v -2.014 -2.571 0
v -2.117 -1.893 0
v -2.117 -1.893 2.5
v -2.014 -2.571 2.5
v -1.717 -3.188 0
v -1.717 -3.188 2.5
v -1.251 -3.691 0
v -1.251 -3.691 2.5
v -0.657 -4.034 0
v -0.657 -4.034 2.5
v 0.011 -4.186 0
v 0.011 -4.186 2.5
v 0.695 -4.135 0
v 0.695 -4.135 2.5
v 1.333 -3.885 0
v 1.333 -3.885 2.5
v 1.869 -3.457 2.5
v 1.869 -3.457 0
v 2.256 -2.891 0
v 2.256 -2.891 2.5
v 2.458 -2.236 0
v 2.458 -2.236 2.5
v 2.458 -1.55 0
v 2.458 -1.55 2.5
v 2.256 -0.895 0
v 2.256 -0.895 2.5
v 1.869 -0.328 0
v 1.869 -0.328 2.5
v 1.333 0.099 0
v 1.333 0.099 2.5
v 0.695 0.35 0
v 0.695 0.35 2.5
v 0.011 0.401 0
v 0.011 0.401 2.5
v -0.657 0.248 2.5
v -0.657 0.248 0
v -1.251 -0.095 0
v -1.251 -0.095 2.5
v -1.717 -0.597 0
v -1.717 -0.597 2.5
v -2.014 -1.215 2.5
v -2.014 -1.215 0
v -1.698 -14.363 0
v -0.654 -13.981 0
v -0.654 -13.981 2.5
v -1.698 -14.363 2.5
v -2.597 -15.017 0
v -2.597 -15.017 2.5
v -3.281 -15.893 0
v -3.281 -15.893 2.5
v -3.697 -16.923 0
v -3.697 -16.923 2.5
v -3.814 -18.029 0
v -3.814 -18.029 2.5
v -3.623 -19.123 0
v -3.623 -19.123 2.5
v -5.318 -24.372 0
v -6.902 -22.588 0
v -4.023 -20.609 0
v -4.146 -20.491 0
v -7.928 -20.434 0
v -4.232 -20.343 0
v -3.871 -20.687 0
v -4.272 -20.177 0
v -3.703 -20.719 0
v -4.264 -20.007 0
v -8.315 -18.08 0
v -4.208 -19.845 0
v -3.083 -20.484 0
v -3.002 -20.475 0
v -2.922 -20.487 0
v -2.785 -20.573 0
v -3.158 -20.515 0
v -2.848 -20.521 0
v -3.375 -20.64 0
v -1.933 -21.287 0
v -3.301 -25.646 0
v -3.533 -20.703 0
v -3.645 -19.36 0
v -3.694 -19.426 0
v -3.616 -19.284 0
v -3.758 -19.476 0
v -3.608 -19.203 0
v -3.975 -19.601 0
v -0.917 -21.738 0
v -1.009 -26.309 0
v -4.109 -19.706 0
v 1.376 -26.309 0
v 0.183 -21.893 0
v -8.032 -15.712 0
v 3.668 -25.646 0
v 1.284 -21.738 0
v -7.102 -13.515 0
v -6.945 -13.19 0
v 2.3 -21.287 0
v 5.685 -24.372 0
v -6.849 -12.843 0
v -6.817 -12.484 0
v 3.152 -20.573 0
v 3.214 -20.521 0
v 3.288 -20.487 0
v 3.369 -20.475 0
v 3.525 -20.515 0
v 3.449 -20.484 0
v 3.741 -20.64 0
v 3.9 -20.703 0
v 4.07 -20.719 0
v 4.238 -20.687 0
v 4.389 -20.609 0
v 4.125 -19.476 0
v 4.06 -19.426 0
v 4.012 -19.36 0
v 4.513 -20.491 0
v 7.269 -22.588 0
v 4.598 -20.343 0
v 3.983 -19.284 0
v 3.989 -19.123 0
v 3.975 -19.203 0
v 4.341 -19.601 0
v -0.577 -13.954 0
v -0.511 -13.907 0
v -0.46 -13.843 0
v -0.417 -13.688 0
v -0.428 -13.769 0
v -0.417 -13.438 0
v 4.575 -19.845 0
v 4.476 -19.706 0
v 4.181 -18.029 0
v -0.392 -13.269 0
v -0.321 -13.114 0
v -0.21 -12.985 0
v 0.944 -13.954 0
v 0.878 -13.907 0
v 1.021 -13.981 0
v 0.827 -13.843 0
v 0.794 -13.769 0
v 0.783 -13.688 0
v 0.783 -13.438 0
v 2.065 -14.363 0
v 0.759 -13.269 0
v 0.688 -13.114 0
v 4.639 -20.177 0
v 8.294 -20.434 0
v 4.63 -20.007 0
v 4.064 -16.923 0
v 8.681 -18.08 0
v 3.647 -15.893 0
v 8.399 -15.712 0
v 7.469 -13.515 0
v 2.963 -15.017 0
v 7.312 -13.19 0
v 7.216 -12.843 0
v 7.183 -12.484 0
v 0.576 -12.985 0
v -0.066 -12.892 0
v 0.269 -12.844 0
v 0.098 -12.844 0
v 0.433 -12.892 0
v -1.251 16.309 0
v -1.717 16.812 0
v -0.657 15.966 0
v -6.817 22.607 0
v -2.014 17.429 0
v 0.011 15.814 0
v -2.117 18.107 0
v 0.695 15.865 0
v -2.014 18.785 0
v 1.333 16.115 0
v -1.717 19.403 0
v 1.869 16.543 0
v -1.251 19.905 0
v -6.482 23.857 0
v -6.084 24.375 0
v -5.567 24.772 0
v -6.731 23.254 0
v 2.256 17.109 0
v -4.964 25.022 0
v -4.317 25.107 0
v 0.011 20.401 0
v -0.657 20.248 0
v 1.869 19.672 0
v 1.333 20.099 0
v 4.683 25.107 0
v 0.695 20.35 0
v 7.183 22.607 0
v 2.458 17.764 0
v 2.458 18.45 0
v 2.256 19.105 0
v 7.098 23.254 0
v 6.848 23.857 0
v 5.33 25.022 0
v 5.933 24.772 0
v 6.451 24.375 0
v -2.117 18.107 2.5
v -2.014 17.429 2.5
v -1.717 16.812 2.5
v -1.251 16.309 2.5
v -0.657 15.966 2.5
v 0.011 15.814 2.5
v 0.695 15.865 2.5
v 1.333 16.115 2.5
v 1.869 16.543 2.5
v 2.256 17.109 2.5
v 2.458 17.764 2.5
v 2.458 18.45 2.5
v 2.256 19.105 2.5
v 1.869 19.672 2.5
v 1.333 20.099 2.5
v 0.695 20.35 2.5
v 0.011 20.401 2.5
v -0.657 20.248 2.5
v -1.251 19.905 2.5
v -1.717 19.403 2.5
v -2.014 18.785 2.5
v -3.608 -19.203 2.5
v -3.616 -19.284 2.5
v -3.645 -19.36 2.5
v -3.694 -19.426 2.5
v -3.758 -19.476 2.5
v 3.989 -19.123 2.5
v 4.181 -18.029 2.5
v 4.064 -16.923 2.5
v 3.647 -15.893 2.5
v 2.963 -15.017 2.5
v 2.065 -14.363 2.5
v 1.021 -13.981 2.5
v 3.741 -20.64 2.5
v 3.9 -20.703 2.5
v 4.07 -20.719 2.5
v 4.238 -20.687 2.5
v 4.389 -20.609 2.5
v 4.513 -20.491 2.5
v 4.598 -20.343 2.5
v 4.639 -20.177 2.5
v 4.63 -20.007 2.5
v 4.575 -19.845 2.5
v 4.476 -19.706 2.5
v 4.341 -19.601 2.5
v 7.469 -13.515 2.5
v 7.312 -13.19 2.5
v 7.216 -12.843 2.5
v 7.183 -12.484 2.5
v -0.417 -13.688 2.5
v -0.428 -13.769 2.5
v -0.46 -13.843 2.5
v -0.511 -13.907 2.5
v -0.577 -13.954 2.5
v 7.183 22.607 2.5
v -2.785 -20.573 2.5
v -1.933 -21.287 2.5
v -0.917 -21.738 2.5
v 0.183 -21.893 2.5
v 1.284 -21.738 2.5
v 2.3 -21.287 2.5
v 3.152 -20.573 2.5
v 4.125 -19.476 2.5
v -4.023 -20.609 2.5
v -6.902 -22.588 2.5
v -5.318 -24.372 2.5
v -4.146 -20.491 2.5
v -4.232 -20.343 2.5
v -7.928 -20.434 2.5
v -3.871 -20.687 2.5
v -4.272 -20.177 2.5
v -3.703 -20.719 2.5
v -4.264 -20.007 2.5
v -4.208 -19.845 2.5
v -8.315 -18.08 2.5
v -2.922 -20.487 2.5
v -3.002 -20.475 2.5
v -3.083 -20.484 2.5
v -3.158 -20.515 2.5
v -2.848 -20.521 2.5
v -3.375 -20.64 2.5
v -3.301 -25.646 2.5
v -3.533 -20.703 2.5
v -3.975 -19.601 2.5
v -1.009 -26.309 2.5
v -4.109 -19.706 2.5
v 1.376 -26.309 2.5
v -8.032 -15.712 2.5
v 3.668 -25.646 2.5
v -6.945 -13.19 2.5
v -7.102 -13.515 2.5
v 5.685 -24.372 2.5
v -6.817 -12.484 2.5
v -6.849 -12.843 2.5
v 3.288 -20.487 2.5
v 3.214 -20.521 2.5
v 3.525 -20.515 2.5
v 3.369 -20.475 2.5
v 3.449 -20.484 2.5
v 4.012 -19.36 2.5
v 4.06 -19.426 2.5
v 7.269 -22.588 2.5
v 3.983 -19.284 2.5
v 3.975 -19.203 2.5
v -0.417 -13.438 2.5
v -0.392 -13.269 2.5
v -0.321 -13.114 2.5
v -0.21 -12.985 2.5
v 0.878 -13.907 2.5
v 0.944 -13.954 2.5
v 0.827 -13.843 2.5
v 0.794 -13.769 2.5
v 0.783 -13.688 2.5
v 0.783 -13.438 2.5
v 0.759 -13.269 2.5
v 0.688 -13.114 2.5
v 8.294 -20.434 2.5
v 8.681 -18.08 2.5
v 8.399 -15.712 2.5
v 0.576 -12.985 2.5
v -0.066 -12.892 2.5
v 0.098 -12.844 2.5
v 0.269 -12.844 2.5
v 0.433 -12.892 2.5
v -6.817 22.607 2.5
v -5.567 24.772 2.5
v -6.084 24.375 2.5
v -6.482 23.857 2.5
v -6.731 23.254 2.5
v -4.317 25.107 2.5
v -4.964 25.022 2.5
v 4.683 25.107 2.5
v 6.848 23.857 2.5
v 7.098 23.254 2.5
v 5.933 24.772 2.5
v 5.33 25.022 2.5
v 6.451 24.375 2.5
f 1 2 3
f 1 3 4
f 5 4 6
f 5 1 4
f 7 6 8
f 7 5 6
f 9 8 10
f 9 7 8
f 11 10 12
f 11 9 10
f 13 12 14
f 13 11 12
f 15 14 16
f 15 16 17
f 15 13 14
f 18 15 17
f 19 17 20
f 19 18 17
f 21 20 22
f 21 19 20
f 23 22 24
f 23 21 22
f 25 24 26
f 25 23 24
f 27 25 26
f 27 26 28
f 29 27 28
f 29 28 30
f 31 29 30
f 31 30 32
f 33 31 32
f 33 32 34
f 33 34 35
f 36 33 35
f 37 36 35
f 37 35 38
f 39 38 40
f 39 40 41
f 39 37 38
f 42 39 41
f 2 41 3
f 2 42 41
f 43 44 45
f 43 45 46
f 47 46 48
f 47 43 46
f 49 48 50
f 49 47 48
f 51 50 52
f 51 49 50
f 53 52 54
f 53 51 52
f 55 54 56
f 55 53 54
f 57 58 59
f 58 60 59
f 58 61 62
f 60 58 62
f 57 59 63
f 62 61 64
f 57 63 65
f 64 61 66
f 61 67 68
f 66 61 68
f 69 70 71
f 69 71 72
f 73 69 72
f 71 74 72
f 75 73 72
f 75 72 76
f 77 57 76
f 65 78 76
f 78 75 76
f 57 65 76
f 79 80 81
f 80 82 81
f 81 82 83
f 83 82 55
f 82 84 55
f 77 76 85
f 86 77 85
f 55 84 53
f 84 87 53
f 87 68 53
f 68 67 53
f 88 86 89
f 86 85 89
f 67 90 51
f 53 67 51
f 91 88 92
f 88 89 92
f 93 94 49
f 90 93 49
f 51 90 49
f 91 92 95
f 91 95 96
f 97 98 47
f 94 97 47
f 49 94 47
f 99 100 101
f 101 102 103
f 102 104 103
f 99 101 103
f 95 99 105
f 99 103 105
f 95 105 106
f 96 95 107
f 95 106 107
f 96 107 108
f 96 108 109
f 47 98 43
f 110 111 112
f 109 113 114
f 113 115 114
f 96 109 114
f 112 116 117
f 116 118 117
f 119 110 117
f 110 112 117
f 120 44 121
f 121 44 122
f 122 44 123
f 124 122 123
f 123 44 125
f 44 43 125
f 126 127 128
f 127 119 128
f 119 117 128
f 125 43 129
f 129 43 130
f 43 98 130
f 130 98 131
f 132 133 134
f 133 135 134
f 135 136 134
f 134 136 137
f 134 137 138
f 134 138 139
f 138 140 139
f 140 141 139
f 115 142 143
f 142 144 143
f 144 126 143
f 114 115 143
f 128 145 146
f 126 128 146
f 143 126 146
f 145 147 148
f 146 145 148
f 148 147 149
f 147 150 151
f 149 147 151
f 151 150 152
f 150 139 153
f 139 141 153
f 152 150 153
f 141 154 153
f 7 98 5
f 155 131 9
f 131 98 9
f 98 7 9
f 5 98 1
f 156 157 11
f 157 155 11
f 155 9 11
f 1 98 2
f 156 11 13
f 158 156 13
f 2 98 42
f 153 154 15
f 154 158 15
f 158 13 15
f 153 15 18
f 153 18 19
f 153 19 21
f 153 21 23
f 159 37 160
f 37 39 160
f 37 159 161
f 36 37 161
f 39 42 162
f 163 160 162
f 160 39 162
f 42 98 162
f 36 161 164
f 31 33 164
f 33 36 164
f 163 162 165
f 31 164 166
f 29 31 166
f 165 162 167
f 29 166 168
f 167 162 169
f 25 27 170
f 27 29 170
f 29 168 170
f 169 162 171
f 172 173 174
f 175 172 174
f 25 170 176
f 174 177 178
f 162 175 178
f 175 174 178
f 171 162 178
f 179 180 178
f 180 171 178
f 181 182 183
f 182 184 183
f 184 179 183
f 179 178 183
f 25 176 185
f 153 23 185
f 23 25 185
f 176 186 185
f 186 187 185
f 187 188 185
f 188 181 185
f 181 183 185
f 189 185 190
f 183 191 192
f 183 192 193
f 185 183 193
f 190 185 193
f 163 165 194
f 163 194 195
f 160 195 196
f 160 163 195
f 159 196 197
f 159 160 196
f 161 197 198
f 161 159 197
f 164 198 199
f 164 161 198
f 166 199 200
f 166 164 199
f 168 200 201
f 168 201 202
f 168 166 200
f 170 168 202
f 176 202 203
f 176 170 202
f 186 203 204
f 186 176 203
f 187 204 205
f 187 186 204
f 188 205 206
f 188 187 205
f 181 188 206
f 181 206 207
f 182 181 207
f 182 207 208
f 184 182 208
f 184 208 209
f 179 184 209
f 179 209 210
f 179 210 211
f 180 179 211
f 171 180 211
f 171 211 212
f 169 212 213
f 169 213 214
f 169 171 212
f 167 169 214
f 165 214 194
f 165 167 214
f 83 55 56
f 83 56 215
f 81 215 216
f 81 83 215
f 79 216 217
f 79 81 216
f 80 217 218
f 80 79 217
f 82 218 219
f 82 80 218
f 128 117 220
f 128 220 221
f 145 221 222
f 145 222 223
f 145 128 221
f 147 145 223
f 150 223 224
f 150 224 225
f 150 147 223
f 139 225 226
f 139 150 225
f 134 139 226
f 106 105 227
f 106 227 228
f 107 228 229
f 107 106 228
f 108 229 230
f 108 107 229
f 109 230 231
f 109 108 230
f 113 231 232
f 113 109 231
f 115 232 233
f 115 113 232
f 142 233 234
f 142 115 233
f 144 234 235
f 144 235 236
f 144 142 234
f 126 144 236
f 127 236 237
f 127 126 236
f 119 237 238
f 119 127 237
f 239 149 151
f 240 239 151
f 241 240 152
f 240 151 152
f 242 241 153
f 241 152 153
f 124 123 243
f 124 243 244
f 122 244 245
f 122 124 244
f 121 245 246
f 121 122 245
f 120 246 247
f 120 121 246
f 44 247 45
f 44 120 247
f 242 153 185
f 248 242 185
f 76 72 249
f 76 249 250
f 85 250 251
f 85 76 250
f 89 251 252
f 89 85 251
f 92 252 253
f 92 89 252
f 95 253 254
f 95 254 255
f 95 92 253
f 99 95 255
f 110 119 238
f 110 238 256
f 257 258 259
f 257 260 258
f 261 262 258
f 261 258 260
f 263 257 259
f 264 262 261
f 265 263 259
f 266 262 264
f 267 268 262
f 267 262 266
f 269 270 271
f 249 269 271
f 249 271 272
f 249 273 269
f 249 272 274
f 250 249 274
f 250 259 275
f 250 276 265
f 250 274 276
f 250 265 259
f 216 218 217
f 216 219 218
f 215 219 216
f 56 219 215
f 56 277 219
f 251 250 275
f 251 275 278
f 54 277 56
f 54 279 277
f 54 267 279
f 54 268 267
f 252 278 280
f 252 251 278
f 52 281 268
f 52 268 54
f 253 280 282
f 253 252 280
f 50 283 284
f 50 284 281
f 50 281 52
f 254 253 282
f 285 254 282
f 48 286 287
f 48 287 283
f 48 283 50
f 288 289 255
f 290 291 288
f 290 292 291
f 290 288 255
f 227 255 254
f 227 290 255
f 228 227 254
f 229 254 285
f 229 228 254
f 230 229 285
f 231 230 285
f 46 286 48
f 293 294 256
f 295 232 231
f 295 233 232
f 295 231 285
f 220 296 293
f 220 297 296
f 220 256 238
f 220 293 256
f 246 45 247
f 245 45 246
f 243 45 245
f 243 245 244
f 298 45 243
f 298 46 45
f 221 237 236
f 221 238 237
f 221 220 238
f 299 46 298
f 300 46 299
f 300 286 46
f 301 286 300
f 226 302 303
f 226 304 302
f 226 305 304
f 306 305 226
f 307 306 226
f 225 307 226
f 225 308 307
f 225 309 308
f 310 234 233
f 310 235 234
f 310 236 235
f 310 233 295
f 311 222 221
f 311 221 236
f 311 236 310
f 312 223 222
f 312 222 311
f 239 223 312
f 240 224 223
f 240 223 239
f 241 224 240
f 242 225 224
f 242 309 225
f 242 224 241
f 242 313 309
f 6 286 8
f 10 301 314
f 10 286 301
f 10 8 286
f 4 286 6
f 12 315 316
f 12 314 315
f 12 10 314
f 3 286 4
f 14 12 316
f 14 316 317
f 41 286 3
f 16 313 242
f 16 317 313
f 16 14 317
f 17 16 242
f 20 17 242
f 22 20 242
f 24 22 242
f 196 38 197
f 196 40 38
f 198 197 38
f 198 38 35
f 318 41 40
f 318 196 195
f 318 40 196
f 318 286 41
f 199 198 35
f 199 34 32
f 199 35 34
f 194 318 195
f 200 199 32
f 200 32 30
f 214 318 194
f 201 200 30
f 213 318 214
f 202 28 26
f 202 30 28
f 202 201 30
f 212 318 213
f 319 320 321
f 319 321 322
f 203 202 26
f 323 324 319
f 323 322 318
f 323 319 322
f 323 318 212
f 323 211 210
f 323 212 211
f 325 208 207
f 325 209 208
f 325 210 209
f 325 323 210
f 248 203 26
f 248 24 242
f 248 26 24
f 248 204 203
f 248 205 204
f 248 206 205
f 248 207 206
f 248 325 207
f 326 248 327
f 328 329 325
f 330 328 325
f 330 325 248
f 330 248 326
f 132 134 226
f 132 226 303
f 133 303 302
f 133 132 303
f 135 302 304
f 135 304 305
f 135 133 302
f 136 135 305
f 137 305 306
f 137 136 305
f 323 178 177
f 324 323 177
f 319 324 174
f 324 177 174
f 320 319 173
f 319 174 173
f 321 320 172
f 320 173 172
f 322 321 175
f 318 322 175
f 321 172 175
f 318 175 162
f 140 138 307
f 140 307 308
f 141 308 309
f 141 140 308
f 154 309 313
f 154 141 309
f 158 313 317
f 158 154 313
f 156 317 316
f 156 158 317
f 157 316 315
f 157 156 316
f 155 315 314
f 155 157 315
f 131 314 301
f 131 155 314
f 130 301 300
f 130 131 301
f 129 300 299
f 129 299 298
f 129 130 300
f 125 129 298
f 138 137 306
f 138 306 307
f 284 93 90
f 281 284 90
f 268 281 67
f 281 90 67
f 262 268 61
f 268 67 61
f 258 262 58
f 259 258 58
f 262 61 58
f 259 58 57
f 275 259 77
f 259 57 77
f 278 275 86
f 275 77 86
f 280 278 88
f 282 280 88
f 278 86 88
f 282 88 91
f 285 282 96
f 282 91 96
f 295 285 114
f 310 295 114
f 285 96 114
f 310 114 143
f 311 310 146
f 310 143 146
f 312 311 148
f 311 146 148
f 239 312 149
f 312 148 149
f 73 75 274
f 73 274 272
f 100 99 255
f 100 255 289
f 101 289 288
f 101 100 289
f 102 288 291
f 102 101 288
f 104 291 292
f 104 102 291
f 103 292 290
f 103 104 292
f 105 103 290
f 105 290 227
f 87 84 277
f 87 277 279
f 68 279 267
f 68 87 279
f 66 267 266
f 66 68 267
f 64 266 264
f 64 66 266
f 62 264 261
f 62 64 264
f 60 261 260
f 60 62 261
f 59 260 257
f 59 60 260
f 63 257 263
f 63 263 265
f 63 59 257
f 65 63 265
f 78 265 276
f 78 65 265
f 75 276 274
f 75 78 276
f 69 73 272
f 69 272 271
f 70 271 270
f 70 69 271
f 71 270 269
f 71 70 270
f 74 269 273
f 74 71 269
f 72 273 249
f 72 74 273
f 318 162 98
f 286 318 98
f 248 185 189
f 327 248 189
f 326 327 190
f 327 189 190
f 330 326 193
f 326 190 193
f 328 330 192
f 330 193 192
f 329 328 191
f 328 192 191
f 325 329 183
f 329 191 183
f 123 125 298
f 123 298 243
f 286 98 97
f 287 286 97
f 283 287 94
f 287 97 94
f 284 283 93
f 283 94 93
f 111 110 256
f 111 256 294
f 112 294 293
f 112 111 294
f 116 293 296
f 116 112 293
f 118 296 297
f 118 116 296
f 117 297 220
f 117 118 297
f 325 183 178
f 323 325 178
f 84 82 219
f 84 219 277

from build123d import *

# Parameters (mm, degrees)
EXTRUDE_1_DEPTH = 2.5


with BuildPart() as part:
    # 草图1 → 凸台-拉伸1 (new body)
    with BuildSketch(Plane.XY):
        with BuildLine():
            Line((7.183350415, -12.48442441), (7.183350415, 22.607248677))
            ThreePointArc((7.183350415, 22.607248677), (6.451117367, 24.37501563), (4.683350415, 25.107248677))
            Line((4.683350415, 25.107248677), (-4.316649585, 25.107248677))
            ThreePointArc((-4.316649585, 25.107248677), (-6.084416538, 24.37501563), (-6.816649585, 22.607248677))
            Line((-6.816649585, 22.607248677), (-6.816649585, -12.48442441))
            ThreePointArc((-6.816649585, -12.48442441), (-6.889401362, -13.018946893), (-7.102363871, -13.514581917))
            ThreePointArc((-7.102363871, -13.514581917), (0.183350415, -26.392751323), (7.4690647, -13.514581917))
            ThreePointArc((7.4690647, -13.514581917), (7.256102191, -13.018946893), (7.183350415, -12.48442441))
        make_face()
        with BuildLine():
            Line((4.341271874, -19.600508074), (4.124778706, -19.475515685))
            ThreePointArc((4.124778706, -19.475515685), (3.994781084, -19.323417542), (3.98933022, -19.123408756))
            ThreePointArc((3.98933022, -19.123408756), (3.64745203, -15.892751323), (1.020559717, -13.981347408))
            ThreePointArc((1.020559717, -13.981347408), (0.850072459, -13.876622428), (0.783350415, -13.687992114))
            Line((0.783350415, -13.687992114), (0.783350415, -13.438007336))
            ThreePointArc((0.783350415, -13.438007336), (0.183350415, -12.838007336), (-0.416649585, -13.438007336))
            Line((-0.416649585, -13.438007336), (-0.416649585, -13.687992114))
            ThreePointArc((-0.416649585, -13.687992114), (-0.48337163, -13.876622428), (-0.653858888, -13.981347408))
            ThreePointArc((-0.653858888, -13.981347408), (-3.280751201, -15.892751323), (-3.622629391, -19.123408756))
            ThreePointArc((-3.622629391, -19.123408756), (-3.628080255, -19.323417542), (-3.758077877, -19.475515685))
            Line((-3.758077877, -19.475515685), (-3.974571045, -19.600508074))
            ThreePointArc((-3.974571045, -19.600508074), (-4.194186288, -20.420123316), (-3.374571045, -20.639738558))
            Line((-3.374571045, -20.639738558), (-3.158077877, -20.514746169))
            ThreePointArc((-3.158077877, -20.514746169), (-2.961358211, -20.478213997), (-2.785420089, -20.573497804))
            ThreePointArc((-2.785420089, -20.573497804), (0.183350415, -21.892751323), (3.152120918, -20.573497804))
            ThreePointArc((3.152120918, -20.573497804), (3.32805904, -20.478213997), (3.524778706, -20.514746169))
            Line((3.524778706, -20.514746169), (3.741271874, -20.639738558))
            ThreePointArc((3.741271874, -20.639738558), (4.560887117, -20.420123316), (4.341271874, -19.600508074))
        make_face(mode=Mode.SUBTRACT)
        with BuildLine():
            ThreePointArc((2.483350415, -1.892751323), (0.183350415, 0.407248677), (-2.116649585, -1.892751323))
            ThreePointArc((-2.116649585, -1.892751323), (0.183350415, -4.192751323), (2.483350415, -1.892751323))
        make_face(mode=Mode.SUBTRACT)
        with BuildLine():
            ThreePointArc((2.483350415, 18.107248677), (0.183350415, 20.407248677), (-2.116649585, 18.107248677))
            ThreePointArc((-2.116649585, 18.107248677), (0.183350415, 15.807248677), (2.483350415, 18.107248677))
        make_face(mode=Mode.SUBTRACT)
    extrude(amount=EXTRUDE_1_DEPTH)


solid = part.part
